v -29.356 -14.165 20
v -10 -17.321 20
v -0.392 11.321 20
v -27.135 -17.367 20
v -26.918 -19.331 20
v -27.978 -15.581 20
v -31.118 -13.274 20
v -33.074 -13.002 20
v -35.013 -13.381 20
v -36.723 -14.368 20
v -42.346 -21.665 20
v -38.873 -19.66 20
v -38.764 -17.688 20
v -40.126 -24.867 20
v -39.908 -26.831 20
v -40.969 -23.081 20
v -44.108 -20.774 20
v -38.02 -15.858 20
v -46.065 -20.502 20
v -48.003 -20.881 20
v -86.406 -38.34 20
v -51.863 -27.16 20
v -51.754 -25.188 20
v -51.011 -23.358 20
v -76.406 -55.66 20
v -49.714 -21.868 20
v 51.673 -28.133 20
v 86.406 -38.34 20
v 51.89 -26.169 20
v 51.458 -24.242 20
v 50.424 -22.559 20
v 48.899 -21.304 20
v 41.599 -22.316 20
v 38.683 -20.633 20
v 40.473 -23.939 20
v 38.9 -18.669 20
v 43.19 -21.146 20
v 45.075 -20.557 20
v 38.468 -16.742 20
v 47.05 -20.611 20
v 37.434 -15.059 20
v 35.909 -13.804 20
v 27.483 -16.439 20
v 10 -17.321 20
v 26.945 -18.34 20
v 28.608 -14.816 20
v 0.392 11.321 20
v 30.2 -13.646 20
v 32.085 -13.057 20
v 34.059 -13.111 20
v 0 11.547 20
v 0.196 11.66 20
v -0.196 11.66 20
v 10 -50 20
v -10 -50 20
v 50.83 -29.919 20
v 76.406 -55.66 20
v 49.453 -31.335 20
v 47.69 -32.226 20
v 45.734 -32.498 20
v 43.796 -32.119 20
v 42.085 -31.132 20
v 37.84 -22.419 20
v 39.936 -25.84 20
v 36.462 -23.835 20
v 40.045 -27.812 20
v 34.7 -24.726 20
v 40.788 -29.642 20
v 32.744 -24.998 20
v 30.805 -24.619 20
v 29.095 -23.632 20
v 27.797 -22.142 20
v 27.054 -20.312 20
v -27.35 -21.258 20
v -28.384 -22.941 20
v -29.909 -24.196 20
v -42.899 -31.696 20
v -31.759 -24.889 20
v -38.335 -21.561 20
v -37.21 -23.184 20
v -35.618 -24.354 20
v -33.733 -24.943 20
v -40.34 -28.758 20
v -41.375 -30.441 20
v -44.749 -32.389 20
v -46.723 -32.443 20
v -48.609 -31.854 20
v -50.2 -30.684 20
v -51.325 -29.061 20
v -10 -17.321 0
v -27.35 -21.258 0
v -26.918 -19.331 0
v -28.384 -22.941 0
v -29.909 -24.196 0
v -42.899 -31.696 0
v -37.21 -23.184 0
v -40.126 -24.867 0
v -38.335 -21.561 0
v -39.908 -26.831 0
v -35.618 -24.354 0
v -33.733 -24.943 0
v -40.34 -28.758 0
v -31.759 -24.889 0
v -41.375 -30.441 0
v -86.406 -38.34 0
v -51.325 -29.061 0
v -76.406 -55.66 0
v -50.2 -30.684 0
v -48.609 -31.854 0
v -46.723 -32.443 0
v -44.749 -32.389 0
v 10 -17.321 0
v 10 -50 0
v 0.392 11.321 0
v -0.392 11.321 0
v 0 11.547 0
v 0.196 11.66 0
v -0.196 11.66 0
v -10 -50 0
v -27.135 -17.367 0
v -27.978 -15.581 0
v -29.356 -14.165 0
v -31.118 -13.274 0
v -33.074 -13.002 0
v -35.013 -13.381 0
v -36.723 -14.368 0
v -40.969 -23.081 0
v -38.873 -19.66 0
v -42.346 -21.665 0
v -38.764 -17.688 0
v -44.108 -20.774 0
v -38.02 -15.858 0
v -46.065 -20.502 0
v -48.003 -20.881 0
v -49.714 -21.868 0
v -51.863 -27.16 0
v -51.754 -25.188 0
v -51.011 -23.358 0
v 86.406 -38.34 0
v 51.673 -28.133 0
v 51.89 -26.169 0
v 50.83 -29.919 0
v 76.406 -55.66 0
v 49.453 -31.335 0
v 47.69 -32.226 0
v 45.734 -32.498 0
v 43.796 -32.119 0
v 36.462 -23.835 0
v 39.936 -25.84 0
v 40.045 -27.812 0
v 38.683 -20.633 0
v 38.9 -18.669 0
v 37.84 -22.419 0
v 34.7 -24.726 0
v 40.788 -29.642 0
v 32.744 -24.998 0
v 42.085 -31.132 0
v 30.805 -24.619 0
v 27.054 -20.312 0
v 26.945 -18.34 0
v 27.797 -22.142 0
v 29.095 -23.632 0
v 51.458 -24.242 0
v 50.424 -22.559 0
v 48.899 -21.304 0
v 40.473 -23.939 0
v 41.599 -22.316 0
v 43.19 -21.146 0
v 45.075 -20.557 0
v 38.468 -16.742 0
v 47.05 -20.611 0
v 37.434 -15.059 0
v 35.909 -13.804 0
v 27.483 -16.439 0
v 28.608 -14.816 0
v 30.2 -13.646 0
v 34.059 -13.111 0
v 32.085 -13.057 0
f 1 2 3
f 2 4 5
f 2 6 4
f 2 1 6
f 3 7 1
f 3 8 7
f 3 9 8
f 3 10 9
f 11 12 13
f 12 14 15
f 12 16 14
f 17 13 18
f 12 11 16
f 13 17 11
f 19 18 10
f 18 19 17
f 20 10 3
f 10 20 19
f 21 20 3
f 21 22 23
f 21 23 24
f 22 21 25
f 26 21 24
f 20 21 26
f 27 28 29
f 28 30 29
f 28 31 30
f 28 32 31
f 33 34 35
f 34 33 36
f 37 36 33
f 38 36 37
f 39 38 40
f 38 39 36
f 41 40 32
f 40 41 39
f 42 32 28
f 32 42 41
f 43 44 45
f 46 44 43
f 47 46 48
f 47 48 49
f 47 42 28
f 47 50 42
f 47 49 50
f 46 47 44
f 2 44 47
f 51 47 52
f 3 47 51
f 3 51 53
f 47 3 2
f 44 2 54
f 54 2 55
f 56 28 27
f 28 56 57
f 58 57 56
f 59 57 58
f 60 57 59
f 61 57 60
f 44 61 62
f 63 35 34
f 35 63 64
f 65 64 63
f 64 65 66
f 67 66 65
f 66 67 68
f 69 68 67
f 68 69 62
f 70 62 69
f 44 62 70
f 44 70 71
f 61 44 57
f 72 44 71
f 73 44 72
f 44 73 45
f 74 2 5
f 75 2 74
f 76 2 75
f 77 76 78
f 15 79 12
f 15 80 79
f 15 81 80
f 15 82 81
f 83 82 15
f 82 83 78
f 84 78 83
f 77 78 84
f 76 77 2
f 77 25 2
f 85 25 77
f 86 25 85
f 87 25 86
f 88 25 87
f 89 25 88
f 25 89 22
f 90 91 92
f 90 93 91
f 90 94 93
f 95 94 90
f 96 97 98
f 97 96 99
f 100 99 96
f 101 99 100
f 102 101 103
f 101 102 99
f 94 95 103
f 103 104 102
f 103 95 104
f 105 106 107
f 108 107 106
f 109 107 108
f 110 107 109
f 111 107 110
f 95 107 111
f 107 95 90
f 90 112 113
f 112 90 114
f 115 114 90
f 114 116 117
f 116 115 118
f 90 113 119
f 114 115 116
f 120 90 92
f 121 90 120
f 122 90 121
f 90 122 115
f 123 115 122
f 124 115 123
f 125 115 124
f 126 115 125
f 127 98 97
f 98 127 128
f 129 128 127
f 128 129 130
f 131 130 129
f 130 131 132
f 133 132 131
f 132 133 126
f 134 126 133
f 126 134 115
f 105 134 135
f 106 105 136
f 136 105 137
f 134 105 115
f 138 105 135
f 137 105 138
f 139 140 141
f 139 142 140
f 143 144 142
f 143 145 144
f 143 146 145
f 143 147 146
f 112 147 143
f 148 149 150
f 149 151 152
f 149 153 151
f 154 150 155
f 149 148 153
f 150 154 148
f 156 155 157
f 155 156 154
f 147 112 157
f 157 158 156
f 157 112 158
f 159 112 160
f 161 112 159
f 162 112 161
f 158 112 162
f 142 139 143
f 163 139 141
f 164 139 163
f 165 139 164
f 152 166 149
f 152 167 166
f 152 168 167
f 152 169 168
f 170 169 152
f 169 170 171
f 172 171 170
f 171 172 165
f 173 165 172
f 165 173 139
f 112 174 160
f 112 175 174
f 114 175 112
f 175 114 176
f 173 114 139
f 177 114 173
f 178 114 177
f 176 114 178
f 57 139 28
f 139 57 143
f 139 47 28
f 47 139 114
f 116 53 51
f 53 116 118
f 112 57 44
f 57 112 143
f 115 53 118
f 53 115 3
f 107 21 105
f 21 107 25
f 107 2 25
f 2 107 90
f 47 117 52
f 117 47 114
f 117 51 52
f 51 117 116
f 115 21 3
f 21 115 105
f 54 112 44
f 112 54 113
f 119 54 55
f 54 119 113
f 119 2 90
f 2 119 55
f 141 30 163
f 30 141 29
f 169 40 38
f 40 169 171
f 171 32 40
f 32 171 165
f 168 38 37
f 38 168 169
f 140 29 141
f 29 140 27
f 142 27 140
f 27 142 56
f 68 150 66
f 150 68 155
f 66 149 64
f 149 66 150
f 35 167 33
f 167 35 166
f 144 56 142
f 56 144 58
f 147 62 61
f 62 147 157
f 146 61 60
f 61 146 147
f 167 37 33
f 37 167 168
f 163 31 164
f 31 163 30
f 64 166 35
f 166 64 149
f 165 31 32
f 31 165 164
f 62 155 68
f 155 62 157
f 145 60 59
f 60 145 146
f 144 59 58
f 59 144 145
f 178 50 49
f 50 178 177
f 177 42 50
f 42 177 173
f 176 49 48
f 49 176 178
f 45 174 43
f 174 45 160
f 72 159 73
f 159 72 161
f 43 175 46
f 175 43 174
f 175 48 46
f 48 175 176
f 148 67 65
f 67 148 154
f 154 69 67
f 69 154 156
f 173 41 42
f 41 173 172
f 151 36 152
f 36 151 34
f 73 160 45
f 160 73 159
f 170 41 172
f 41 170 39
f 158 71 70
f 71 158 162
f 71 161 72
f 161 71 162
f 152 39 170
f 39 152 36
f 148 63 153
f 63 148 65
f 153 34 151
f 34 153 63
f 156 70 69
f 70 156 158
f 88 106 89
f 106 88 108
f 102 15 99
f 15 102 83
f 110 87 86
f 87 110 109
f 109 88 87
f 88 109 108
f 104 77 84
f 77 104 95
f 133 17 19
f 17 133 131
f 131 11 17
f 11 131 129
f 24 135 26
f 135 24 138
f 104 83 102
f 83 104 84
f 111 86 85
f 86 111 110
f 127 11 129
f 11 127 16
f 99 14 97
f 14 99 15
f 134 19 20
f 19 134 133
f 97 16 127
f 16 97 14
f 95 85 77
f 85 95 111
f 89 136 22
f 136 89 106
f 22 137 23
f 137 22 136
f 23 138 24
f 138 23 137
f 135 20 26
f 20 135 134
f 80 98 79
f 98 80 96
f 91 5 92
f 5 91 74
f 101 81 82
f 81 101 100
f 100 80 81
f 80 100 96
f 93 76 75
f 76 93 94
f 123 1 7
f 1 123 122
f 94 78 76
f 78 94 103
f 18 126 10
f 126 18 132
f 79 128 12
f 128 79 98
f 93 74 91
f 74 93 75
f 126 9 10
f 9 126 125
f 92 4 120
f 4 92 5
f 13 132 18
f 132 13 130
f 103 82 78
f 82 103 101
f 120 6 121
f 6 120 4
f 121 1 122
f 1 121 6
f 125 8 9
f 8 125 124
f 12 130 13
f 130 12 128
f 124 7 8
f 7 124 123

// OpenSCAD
module corner_body()
{
	rotate([90,0,60]) translate([-10,0,-6]) cube([20,20,100]);
        rotate([90,0,-60]) translate([-10,0,-6]) cube([20,20,100]);
        rotate([0,0,180]) translate([-10,0,0]) cube([20,50,20]);	
}

module corner_cuts()
{
	rotate([0,0,60]) translate([0,-53,-.1])    cylinder(r=6,h=20.2);
	rotate([0,0,60]) translate([0,-53+15,-.1]) cylinder(r=6,h=20.2);
	rotate([0,0,-60]) translate([0,-53,-.1])    cylinder(r=6,h=20.2);
	rotate([0,0,-60]) translate([0,-53+15,-.1]) cylinder(r=6,h=20.2);
	
	rotate([0,0,-60]) translate([0,-53+15,-.1]) cylinder(r=6,h=20.2);
	
	
}


module corner()
{
		difference(){
			corner_body();
			corner_cuts();
		}
	
}

corner();
